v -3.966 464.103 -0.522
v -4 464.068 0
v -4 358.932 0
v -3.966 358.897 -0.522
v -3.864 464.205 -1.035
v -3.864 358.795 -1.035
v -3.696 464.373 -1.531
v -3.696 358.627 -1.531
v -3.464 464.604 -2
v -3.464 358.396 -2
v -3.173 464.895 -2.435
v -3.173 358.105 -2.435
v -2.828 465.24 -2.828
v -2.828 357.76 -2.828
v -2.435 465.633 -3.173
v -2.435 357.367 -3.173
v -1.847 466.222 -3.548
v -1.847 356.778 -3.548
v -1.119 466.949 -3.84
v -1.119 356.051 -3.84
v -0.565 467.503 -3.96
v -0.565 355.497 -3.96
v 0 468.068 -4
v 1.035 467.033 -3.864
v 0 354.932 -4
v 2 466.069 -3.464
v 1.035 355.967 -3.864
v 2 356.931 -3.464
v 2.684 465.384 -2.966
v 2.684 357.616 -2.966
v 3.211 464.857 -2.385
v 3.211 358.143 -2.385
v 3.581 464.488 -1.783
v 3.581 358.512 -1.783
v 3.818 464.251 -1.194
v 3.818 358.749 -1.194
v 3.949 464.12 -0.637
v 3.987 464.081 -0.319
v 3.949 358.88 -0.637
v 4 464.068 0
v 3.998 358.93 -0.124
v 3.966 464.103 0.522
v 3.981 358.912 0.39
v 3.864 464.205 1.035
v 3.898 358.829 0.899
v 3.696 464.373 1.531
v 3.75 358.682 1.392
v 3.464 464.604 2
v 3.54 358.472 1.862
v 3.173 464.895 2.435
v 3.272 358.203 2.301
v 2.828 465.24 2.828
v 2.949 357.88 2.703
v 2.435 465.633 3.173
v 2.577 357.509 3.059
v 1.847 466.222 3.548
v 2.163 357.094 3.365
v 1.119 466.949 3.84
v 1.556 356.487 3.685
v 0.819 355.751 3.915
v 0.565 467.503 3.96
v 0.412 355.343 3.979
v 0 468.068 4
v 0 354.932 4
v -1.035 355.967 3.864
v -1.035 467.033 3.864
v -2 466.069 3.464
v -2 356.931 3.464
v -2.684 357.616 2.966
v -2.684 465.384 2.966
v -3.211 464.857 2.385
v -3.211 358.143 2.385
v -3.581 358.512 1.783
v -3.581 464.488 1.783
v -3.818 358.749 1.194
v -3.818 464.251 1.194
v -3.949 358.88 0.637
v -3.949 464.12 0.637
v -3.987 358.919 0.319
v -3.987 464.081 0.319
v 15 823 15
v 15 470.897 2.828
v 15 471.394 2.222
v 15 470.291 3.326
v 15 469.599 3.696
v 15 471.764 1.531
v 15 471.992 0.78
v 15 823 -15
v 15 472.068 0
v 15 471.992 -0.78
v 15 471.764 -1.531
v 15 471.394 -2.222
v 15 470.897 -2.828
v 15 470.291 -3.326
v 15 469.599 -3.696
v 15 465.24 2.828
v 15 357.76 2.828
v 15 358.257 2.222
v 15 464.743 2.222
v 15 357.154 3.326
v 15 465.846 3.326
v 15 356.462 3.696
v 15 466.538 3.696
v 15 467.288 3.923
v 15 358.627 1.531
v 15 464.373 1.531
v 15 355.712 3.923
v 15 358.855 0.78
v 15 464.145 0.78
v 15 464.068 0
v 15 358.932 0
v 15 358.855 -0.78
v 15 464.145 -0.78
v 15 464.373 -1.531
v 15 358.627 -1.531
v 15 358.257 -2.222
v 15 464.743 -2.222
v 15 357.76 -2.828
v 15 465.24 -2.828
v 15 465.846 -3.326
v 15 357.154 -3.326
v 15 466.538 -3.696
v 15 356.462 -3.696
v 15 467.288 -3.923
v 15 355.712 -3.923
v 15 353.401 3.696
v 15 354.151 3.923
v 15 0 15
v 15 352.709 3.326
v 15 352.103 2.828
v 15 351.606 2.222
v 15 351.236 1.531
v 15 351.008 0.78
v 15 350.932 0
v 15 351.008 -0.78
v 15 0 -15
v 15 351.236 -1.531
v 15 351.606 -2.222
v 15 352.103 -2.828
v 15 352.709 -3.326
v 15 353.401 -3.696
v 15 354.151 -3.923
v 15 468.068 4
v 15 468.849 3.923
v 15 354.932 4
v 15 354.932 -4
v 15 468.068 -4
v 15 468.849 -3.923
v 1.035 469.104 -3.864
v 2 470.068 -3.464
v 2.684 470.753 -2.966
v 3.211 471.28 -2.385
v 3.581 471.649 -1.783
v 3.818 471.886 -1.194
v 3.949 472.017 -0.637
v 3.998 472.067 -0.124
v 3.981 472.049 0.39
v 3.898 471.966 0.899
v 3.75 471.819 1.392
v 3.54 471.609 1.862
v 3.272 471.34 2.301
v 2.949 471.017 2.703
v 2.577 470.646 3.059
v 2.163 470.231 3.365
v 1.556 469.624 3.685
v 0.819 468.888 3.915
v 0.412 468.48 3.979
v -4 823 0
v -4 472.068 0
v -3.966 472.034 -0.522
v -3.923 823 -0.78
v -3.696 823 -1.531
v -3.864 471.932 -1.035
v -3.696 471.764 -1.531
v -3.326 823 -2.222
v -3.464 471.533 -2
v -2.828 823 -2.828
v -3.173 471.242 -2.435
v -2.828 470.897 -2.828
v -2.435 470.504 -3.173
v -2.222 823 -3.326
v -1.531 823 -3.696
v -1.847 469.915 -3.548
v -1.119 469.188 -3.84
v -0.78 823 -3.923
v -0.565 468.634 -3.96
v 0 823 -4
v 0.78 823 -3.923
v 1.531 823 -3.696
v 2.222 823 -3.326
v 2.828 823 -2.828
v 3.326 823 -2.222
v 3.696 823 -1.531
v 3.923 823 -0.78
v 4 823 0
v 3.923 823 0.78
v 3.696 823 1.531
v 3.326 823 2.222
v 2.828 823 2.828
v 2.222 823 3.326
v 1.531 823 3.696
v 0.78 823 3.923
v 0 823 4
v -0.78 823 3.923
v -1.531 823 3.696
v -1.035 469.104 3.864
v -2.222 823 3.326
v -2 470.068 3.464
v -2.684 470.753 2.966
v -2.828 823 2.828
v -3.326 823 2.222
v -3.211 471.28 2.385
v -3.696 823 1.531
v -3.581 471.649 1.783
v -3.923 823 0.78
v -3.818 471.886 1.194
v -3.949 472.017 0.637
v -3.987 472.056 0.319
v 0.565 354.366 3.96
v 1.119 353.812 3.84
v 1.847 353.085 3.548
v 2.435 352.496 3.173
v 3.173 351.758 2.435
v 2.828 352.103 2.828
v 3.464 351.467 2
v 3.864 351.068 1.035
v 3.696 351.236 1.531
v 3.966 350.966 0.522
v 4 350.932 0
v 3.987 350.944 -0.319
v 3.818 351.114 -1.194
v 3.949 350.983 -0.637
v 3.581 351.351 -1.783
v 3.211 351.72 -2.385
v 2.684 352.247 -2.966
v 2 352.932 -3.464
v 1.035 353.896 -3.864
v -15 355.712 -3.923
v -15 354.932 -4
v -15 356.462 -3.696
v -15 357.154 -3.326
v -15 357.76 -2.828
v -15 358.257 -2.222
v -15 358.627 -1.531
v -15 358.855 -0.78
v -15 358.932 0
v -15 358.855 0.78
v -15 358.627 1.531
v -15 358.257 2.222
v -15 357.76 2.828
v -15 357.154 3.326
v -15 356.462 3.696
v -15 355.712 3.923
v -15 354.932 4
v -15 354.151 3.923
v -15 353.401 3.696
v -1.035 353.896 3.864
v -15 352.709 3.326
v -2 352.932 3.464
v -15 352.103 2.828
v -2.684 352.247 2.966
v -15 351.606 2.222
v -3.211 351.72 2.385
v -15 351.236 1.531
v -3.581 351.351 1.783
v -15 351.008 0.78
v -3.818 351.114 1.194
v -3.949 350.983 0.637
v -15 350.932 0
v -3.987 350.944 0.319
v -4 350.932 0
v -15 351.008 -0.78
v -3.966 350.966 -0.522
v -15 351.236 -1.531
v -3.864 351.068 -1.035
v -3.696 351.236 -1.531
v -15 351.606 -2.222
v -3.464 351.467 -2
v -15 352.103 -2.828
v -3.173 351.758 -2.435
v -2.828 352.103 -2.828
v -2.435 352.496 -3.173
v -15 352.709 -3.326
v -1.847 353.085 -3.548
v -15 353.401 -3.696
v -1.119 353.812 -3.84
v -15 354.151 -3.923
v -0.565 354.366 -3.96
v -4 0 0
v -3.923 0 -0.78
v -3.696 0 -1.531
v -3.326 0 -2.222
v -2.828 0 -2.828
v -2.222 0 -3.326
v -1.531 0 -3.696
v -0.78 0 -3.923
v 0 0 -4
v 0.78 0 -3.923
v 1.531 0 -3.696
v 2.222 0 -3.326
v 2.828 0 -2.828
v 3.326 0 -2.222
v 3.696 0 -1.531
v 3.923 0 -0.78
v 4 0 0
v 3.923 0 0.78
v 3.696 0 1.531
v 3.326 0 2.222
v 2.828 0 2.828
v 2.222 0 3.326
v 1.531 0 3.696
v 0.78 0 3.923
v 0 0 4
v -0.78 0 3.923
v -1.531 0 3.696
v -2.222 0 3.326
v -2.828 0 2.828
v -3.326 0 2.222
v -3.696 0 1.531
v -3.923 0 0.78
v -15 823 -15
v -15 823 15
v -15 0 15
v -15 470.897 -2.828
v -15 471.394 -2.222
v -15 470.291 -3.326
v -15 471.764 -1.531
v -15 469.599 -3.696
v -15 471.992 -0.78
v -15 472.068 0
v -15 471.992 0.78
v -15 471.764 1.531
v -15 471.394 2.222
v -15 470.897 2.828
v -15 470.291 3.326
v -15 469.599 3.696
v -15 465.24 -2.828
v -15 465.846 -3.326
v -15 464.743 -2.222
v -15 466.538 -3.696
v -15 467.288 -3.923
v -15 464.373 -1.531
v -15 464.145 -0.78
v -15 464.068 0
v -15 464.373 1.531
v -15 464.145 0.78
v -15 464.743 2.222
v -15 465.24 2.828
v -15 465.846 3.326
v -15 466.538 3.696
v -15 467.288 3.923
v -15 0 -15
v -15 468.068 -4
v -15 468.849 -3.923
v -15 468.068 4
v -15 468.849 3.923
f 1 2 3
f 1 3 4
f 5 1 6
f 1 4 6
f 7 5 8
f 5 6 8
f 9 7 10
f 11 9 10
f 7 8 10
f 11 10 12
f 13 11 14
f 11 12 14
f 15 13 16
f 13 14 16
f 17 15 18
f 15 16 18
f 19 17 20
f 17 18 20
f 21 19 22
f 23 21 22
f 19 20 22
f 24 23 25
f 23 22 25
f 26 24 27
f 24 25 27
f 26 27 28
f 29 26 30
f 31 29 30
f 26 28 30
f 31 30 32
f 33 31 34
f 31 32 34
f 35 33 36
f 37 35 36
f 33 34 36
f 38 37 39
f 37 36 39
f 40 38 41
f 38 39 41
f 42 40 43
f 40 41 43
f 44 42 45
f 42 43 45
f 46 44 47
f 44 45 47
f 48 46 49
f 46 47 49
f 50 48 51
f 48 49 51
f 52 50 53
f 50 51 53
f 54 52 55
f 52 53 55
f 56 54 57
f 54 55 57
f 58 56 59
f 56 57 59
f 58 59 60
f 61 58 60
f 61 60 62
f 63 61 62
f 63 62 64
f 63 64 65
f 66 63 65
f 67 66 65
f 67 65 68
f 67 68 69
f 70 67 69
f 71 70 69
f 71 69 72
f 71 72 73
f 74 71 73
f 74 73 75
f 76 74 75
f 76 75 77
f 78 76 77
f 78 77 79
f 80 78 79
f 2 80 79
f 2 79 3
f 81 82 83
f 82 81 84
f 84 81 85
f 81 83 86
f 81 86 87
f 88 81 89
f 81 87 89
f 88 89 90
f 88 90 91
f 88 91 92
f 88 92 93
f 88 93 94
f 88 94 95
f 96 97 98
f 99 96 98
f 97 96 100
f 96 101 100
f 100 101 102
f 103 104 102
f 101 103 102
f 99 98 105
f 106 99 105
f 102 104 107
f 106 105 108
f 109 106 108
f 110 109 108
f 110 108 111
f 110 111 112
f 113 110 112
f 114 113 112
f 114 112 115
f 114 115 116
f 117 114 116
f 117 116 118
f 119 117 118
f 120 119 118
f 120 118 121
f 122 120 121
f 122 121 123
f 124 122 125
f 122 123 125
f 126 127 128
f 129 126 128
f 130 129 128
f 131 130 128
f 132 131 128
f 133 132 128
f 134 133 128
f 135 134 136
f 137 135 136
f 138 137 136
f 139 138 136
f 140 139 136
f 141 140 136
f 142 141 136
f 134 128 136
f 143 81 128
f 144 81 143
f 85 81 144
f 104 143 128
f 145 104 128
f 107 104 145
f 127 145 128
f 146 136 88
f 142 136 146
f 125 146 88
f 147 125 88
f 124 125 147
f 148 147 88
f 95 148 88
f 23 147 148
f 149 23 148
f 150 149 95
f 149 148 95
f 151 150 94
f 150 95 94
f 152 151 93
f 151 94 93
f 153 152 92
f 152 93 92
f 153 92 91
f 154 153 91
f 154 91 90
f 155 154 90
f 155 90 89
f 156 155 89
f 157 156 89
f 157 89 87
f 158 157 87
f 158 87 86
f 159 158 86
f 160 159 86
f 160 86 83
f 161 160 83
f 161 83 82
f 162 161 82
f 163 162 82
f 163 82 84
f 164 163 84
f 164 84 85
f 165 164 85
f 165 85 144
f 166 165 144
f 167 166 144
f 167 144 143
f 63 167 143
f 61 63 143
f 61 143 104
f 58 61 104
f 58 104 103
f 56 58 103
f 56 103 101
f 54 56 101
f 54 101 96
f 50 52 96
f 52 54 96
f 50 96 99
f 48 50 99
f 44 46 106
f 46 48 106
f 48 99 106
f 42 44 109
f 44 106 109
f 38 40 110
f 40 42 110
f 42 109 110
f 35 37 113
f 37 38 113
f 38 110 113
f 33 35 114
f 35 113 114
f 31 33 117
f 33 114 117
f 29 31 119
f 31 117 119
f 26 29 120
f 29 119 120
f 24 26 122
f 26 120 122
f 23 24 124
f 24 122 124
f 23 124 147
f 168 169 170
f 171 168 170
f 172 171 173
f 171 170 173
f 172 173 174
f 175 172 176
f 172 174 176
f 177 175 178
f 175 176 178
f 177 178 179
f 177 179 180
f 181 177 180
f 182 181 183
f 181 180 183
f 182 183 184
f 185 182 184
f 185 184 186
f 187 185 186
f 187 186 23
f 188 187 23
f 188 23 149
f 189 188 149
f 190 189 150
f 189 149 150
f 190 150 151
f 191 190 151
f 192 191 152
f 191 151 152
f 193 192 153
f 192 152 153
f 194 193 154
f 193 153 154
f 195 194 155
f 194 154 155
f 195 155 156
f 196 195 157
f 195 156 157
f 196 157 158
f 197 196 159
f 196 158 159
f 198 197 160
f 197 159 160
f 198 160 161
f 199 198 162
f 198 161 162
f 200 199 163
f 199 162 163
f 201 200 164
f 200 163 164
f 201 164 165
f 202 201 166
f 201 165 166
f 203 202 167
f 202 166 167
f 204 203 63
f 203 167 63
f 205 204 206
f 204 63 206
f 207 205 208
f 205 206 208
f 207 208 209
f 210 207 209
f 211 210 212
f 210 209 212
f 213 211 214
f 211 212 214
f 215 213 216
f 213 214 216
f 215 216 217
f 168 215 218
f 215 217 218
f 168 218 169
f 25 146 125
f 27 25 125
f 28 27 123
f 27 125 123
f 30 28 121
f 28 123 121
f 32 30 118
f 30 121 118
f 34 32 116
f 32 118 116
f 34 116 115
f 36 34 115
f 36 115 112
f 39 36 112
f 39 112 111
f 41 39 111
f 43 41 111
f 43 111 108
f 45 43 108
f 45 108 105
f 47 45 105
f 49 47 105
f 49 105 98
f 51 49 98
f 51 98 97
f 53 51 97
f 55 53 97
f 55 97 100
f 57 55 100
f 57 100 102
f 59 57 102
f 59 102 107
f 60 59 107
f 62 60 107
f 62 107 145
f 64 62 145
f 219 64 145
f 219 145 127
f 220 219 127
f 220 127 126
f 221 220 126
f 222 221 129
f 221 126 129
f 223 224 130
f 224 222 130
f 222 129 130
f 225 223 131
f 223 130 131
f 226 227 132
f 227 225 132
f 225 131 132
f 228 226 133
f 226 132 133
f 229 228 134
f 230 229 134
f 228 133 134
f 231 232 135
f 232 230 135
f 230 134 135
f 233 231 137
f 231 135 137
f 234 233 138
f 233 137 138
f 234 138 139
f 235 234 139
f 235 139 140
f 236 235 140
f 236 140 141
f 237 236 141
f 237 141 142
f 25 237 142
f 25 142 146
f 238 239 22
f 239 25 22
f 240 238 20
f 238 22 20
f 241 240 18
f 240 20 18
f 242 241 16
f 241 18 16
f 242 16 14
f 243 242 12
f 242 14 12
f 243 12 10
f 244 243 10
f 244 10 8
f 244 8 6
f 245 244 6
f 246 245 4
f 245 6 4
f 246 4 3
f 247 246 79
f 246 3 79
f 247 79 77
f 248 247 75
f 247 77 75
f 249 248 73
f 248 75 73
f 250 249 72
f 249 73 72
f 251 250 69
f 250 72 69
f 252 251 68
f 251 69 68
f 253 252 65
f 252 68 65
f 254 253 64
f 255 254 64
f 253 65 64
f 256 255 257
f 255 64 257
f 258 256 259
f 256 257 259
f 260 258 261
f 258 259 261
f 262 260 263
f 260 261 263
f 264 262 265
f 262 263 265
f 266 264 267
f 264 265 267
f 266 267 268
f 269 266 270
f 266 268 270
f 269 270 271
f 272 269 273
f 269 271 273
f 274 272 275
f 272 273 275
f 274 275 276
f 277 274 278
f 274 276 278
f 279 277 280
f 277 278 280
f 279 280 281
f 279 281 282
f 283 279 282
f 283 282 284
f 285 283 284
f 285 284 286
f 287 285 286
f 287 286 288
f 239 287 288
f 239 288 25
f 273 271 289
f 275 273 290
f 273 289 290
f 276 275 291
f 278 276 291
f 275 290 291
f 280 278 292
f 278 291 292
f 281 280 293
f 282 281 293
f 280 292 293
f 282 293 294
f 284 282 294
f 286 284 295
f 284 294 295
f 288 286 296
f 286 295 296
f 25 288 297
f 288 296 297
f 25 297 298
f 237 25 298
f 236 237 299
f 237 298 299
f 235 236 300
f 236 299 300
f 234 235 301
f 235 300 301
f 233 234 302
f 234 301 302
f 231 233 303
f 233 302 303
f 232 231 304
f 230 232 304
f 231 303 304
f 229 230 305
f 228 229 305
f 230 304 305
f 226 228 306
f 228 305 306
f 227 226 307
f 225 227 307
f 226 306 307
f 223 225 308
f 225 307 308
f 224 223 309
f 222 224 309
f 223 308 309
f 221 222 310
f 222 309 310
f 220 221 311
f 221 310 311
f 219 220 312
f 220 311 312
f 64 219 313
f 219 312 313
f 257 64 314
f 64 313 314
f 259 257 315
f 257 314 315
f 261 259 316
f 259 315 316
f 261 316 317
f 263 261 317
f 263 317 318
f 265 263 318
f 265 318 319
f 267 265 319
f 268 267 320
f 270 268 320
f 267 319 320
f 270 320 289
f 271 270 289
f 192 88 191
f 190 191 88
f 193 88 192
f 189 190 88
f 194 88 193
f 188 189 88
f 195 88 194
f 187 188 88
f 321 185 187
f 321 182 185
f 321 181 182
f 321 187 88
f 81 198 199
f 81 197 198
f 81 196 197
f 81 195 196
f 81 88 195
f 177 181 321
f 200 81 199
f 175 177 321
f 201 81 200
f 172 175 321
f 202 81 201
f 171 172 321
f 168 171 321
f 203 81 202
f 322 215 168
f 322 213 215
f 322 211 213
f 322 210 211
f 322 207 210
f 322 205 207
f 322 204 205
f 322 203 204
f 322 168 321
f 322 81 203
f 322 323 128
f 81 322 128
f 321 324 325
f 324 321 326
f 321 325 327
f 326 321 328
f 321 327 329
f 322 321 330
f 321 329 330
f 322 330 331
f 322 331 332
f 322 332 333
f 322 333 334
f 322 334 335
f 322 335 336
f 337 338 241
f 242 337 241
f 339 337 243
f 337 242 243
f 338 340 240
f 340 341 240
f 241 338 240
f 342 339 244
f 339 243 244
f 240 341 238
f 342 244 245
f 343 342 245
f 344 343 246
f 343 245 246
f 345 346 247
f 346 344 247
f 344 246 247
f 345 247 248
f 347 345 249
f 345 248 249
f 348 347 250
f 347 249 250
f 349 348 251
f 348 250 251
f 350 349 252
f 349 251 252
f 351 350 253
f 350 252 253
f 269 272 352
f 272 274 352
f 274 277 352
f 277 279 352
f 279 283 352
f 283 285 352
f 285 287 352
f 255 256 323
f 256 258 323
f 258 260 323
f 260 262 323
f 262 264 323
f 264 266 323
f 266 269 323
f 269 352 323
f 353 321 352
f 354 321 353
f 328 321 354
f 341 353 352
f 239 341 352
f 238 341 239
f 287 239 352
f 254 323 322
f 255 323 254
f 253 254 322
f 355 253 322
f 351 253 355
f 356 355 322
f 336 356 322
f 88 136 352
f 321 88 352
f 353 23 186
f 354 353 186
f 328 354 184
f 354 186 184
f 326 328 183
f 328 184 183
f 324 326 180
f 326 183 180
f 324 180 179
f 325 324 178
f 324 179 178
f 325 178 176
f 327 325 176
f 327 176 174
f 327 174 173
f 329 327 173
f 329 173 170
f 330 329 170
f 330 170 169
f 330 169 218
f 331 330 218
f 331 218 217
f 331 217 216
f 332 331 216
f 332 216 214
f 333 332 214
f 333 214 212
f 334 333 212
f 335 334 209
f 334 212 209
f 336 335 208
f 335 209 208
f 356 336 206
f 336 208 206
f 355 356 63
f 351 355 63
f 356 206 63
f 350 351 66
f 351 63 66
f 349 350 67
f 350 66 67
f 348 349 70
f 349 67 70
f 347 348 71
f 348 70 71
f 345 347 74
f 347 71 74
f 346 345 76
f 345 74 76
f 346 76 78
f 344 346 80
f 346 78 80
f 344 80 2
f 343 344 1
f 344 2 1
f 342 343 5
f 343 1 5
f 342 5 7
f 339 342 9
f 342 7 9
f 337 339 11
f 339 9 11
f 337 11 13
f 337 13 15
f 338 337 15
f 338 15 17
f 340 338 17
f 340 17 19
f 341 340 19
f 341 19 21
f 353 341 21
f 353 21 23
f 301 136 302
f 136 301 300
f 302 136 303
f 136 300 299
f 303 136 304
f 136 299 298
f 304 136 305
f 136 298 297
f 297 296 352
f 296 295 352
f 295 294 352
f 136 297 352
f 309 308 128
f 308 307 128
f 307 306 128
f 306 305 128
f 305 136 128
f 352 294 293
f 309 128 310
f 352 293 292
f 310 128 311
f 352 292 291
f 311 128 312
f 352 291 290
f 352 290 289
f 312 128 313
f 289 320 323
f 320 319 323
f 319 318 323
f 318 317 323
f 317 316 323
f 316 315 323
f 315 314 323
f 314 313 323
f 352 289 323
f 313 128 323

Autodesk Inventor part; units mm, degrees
ref_plane "YZ Plane" through (0, 0, 0) normal (1, 0, 0) x (0, 1, 0)
ref_plane "XZ Plane" through (0, 0, 0) normal (0, 1, 0) x (-1, 0, 0)
ref_plane "XY Plane" through (0, 0, 0) normal (0, 0, 1) x (1, 0, 0)
sketch "Boceto1" plane through (0, 0, 0) normal (0, 1, 0) x (-1, 0, 0)
  line L0 (15, 15) -> (-15, 15)
  line L1 (-15, 15) -> (-15, -15)
  line L2 (-15, -15) -> (15, -15)
  line L3 (15, -15) -> (15, 15)
  line L4 (15, 15) -> (-15, -15) construction
  circle A0 centre (0, 0) radius 4
  dimension "d0" = 30
  dimension "d1" = 8
extrude "Extrusión1" add sketch "Boceto1" along normal blind 823
sketch "Sketch7" plane through (15, 0, 15) normal (1, 0, 0) x (0, 0, -1)
  line L0 (30, 0) -> (30, 823) projected
  line L1 (0, 0) -> (0, 823) projected
  line L2 (0, 411.5) -> (15, 411.5)
  circle A0 centre (15, 354.9315) radius 4
  circle A1 centre (15, 468.0685) radius 4
  point P0 (15, 0)
  dimension "d14" = 8
  dimension "d15" = 8
extrude "Extrusion3" cut sketch "Sketch7" against normal blind 35
properties part number "P_3030_1500"
